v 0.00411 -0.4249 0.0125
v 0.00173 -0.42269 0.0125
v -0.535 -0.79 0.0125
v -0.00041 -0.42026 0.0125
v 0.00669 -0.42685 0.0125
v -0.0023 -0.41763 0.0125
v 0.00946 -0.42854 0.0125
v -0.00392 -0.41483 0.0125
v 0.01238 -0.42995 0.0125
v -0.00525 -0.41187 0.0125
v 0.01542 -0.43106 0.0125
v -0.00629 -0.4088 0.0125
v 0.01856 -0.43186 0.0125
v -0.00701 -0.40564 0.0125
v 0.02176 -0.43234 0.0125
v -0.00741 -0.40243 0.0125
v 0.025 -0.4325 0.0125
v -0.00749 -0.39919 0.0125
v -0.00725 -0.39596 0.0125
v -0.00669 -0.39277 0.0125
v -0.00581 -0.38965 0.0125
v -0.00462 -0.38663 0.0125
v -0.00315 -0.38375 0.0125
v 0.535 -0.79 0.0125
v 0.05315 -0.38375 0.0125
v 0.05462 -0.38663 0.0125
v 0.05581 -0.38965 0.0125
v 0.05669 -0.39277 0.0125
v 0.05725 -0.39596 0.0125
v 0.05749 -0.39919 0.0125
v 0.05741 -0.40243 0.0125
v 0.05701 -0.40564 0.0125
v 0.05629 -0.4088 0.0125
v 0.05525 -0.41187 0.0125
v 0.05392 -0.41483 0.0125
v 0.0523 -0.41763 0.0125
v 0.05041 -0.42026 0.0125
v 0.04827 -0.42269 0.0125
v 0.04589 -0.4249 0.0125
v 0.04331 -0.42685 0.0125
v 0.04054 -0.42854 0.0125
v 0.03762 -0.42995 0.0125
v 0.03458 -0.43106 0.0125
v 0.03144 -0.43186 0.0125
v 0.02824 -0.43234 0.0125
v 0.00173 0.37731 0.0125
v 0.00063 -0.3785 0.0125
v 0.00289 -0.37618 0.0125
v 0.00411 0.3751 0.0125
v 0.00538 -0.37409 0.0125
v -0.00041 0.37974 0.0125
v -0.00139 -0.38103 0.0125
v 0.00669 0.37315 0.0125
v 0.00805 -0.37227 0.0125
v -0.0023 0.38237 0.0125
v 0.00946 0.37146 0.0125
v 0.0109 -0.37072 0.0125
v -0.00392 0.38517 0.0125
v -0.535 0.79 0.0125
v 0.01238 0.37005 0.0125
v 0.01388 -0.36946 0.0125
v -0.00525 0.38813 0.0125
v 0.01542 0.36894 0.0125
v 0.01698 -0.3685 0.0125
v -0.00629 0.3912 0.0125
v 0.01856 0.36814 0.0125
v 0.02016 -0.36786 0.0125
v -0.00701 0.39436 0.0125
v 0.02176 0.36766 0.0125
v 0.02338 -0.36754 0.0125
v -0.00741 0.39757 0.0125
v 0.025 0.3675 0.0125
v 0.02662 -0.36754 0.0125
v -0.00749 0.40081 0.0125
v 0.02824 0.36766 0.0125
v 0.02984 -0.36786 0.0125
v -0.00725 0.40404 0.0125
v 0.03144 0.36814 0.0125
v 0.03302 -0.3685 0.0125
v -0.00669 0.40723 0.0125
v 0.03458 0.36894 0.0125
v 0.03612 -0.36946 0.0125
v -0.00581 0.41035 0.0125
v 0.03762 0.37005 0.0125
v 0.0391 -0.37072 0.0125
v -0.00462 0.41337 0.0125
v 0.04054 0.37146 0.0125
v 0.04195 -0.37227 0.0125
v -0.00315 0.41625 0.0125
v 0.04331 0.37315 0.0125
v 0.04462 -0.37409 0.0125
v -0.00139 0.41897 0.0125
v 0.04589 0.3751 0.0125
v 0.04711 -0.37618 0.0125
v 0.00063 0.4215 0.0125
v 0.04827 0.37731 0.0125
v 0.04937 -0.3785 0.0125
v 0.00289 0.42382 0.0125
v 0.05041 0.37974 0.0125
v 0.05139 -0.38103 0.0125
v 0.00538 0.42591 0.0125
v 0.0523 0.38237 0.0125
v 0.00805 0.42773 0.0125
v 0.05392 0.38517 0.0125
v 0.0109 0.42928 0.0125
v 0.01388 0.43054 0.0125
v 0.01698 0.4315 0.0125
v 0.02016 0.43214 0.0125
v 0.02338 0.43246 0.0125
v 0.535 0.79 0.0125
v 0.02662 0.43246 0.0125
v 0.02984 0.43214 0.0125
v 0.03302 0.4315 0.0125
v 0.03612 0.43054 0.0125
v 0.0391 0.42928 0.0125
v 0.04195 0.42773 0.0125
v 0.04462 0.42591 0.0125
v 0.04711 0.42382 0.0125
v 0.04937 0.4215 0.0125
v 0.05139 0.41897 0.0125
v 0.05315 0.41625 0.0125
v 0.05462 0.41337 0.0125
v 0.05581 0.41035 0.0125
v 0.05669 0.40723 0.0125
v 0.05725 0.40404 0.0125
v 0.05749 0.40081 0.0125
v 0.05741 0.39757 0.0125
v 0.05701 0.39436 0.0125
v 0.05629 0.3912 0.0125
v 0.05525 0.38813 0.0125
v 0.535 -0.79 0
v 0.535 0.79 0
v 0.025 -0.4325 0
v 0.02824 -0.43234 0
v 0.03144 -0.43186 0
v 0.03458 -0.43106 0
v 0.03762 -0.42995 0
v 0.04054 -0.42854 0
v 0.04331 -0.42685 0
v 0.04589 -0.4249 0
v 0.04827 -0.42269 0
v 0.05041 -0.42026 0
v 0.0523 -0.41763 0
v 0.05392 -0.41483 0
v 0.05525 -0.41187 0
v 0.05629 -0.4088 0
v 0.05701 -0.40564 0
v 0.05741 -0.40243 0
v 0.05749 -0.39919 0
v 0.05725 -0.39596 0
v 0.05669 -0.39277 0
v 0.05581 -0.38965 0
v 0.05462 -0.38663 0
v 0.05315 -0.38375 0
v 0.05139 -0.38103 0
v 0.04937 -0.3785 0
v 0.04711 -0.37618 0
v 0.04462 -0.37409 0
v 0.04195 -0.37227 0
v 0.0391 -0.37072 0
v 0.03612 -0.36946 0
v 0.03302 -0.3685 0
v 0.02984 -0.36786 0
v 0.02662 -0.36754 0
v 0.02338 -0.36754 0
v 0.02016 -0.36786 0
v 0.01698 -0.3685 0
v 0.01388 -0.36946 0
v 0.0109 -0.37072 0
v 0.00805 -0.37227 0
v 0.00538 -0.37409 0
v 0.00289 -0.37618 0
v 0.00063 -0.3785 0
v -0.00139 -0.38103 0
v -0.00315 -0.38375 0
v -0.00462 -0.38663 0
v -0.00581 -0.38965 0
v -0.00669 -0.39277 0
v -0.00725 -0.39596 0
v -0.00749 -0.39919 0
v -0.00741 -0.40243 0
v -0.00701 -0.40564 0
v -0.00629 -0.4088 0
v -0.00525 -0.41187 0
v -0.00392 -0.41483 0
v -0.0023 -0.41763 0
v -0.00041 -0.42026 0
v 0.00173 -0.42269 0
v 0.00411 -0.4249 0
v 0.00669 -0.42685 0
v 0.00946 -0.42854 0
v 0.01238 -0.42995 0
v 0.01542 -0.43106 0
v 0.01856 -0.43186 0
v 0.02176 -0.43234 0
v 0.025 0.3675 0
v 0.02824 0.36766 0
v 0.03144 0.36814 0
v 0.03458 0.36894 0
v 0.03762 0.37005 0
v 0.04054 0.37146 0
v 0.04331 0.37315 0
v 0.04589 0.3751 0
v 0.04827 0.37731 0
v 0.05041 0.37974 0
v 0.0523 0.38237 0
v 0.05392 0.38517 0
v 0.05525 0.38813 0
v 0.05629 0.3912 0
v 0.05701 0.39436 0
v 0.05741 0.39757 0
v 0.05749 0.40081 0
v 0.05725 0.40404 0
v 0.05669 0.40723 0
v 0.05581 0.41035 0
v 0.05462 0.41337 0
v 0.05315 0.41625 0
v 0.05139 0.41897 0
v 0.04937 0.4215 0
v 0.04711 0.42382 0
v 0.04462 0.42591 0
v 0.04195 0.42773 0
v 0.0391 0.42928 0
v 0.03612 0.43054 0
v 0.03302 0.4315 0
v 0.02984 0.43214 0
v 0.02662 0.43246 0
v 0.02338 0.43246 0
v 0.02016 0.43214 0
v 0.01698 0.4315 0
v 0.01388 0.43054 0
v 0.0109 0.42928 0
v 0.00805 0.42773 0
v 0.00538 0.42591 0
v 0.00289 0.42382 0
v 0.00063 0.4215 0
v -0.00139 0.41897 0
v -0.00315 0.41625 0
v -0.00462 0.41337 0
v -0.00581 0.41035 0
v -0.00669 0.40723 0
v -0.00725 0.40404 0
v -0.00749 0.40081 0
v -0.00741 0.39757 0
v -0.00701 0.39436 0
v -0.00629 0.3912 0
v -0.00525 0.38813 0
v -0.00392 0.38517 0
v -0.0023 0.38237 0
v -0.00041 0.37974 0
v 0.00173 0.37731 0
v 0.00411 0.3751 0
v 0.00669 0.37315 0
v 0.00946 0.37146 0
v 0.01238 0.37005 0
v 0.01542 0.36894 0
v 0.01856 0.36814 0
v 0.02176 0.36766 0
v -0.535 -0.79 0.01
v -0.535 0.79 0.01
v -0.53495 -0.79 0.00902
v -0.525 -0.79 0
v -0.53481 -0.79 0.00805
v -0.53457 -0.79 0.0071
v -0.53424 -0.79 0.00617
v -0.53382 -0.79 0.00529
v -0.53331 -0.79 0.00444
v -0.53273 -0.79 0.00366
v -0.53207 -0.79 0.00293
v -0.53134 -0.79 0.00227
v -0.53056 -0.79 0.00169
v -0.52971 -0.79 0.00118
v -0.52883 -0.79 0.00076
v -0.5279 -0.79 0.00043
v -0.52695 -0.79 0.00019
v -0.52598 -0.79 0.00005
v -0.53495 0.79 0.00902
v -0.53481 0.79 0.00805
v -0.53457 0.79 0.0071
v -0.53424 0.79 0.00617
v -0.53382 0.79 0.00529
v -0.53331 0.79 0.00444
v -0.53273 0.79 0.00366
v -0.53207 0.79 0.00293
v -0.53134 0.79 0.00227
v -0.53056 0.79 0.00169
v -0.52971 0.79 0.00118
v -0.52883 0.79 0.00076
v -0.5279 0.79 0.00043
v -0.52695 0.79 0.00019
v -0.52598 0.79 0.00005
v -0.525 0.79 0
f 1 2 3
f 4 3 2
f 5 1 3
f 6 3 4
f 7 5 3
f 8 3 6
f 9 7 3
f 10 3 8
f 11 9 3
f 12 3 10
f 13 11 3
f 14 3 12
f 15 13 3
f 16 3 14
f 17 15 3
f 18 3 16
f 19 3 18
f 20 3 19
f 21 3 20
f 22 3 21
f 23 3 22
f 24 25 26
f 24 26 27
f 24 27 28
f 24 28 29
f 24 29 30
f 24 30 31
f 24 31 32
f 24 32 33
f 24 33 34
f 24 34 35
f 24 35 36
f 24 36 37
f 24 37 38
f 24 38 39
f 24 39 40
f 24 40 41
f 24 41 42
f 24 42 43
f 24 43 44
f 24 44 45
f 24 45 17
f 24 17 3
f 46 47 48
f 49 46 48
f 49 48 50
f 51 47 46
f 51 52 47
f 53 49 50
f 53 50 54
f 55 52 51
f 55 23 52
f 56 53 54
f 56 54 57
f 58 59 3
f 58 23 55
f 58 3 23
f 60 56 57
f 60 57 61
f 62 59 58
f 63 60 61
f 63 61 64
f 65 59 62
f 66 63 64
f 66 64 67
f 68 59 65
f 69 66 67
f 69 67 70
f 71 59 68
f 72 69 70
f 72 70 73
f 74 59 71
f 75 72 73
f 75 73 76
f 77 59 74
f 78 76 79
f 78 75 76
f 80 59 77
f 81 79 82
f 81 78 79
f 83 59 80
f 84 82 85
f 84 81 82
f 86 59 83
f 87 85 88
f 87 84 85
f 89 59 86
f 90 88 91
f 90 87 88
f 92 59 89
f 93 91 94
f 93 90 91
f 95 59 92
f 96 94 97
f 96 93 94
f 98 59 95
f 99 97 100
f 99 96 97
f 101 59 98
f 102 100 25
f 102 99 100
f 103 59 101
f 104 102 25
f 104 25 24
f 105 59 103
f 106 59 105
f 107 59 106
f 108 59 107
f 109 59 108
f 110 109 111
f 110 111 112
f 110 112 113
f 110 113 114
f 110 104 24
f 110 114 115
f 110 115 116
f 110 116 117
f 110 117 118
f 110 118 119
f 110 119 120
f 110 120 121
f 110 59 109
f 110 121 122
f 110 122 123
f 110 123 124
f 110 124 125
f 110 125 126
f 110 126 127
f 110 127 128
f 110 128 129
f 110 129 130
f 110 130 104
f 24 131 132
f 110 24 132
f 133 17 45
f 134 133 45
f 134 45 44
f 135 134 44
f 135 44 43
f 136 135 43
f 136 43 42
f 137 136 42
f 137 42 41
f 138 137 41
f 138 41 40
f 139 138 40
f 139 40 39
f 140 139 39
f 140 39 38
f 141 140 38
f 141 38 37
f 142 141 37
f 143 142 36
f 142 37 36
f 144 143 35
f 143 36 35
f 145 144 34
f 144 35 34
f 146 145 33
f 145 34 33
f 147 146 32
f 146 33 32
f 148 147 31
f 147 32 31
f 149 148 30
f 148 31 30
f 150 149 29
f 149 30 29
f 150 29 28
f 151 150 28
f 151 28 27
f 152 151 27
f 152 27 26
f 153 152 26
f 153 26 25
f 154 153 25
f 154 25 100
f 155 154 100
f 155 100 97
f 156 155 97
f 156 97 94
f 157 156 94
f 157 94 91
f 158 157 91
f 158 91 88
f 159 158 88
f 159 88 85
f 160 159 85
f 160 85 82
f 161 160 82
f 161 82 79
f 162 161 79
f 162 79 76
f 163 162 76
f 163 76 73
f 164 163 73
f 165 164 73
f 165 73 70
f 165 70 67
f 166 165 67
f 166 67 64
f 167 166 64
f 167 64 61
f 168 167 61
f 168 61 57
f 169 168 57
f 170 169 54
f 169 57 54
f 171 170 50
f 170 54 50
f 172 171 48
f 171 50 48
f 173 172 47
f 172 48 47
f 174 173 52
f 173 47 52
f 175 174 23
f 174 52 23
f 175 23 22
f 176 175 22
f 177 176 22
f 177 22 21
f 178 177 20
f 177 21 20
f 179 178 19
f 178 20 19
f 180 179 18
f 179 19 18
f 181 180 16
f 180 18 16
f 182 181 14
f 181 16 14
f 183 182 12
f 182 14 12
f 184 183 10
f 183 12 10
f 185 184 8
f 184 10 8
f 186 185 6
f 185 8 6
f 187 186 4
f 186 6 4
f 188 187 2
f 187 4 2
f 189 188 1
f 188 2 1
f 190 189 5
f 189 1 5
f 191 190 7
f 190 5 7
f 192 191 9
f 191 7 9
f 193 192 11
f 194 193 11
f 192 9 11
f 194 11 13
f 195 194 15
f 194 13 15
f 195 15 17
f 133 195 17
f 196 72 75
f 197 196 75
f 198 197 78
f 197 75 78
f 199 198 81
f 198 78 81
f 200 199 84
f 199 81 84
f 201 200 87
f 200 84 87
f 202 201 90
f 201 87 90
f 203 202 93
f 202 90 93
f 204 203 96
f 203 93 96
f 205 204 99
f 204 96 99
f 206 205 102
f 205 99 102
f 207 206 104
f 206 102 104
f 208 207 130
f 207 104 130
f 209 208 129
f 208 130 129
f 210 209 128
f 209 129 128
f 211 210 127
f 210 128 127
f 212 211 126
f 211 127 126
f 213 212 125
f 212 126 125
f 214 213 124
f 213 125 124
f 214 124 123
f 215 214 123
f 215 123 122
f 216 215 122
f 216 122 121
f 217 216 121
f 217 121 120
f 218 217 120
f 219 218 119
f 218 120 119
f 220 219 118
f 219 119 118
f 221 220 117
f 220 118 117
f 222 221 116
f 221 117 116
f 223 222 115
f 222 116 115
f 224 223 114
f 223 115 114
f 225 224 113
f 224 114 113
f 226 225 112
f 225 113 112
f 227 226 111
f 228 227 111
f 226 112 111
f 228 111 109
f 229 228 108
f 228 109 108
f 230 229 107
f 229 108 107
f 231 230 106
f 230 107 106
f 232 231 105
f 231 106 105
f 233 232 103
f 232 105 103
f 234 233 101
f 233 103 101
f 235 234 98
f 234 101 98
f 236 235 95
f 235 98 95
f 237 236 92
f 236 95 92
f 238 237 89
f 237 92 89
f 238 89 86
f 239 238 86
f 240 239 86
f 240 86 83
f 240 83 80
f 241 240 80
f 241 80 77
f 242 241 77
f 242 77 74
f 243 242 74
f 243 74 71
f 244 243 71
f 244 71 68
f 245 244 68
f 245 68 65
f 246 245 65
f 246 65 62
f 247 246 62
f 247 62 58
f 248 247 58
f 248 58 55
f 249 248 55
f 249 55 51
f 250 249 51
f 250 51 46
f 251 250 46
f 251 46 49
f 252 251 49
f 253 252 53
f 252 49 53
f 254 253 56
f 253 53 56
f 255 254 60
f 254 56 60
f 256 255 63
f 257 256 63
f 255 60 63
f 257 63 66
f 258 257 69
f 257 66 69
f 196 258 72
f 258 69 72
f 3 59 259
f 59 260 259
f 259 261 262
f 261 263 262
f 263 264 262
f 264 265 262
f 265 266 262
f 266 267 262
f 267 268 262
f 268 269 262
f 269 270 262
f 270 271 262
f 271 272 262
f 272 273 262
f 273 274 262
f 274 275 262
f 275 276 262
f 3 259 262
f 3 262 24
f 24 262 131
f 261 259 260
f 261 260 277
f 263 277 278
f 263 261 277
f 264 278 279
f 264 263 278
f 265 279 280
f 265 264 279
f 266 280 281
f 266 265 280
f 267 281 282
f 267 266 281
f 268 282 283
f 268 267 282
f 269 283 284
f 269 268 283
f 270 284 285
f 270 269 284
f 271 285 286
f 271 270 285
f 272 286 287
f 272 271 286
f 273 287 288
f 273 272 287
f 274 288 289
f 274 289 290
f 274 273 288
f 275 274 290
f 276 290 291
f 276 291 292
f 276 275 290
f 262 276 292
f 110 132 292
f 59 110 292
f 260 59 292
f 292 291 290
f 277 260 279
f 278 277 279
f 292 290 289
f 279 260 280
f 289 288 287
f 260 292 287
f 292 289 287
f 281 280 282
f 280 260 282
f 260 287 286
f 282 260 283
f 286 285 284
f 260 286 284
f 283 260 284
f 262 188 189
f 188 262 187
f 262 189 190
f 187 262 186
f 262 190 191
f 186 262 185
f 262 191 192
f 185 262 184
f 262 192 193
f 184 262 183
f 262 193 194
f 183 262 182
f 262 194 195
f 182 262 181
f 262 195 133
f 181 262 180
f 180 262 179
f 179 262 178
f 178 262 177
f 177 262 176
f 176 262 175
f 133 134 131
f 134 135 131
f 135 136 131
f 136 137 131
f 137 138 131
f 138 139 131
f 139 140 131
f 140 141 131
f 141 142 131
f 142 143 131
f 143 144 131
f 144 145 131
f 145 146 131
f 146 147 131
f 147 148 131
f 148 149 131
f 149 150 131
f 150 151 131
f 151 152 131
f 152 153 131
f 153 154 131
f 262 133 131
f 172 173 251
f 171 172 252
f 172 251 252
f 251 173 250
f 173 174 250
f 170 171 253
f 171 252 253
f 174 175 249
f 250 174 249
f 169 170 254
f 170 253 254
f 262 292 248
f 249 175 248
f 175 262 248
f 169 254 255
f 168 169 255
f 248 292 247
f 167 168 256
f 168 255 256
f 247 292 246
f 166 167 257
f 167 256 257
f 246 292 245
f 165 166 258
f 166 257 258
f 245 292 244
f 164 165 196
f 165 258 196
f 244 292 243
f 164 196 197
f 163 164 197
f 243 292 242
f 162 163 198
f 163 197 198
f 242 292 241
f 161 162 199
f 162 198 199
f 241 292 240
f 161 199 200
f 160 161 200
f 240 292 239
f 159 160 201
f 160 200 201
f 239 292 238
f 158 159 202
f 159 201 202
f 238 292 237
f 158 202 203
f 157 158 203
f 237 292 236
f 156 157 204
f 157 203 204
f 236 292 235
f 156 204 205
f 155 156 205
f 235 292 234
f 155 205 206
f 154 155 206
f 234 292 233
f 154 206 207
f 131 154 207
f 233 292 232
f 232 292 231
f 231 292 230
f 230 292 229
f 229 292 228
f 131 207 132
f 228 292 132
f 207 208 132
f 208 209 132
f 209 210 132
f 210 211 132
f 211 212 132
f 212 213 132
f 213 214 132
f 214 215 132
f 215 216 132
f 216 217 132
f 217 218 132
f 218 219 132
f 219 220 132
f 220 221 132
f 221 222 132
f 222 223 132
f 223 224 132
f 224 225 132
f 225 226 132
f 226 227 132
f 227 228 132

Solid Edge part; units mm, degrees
sketch "Sketch1" plane through (0, 0, 0) normal (0, 0, 1) x (1, 0, 0)
  line L0 (-0.535, -0.79) -> (0.535, -0.79)
  line L1 (0.535, -0.79) -> (0.535, 0.79)
  line L2 (0.535, 0.79) -> (-0.535, 0.79)
  line L3 (-0.535, 0.79) -> (-0.535, -0.79)
  dimension "D1" = 1.07
  dimension "D2" = 1.58
extrude "Protrusion1" add sketch "Sketch1" along normal blind 0.0125
fillet "Verrundung_1" radius 0.01 1 edges at (-0.535, 0, 0)
hole "Bohrung_1" at (0.025, -0.4, 0.0125) direction (0, 0, -1) diameter 0.065 end through all
hole "Hole1" at (0.025, 0.4, 0.0125) direction (0, 0, -1) diameter 0.065 end through all
